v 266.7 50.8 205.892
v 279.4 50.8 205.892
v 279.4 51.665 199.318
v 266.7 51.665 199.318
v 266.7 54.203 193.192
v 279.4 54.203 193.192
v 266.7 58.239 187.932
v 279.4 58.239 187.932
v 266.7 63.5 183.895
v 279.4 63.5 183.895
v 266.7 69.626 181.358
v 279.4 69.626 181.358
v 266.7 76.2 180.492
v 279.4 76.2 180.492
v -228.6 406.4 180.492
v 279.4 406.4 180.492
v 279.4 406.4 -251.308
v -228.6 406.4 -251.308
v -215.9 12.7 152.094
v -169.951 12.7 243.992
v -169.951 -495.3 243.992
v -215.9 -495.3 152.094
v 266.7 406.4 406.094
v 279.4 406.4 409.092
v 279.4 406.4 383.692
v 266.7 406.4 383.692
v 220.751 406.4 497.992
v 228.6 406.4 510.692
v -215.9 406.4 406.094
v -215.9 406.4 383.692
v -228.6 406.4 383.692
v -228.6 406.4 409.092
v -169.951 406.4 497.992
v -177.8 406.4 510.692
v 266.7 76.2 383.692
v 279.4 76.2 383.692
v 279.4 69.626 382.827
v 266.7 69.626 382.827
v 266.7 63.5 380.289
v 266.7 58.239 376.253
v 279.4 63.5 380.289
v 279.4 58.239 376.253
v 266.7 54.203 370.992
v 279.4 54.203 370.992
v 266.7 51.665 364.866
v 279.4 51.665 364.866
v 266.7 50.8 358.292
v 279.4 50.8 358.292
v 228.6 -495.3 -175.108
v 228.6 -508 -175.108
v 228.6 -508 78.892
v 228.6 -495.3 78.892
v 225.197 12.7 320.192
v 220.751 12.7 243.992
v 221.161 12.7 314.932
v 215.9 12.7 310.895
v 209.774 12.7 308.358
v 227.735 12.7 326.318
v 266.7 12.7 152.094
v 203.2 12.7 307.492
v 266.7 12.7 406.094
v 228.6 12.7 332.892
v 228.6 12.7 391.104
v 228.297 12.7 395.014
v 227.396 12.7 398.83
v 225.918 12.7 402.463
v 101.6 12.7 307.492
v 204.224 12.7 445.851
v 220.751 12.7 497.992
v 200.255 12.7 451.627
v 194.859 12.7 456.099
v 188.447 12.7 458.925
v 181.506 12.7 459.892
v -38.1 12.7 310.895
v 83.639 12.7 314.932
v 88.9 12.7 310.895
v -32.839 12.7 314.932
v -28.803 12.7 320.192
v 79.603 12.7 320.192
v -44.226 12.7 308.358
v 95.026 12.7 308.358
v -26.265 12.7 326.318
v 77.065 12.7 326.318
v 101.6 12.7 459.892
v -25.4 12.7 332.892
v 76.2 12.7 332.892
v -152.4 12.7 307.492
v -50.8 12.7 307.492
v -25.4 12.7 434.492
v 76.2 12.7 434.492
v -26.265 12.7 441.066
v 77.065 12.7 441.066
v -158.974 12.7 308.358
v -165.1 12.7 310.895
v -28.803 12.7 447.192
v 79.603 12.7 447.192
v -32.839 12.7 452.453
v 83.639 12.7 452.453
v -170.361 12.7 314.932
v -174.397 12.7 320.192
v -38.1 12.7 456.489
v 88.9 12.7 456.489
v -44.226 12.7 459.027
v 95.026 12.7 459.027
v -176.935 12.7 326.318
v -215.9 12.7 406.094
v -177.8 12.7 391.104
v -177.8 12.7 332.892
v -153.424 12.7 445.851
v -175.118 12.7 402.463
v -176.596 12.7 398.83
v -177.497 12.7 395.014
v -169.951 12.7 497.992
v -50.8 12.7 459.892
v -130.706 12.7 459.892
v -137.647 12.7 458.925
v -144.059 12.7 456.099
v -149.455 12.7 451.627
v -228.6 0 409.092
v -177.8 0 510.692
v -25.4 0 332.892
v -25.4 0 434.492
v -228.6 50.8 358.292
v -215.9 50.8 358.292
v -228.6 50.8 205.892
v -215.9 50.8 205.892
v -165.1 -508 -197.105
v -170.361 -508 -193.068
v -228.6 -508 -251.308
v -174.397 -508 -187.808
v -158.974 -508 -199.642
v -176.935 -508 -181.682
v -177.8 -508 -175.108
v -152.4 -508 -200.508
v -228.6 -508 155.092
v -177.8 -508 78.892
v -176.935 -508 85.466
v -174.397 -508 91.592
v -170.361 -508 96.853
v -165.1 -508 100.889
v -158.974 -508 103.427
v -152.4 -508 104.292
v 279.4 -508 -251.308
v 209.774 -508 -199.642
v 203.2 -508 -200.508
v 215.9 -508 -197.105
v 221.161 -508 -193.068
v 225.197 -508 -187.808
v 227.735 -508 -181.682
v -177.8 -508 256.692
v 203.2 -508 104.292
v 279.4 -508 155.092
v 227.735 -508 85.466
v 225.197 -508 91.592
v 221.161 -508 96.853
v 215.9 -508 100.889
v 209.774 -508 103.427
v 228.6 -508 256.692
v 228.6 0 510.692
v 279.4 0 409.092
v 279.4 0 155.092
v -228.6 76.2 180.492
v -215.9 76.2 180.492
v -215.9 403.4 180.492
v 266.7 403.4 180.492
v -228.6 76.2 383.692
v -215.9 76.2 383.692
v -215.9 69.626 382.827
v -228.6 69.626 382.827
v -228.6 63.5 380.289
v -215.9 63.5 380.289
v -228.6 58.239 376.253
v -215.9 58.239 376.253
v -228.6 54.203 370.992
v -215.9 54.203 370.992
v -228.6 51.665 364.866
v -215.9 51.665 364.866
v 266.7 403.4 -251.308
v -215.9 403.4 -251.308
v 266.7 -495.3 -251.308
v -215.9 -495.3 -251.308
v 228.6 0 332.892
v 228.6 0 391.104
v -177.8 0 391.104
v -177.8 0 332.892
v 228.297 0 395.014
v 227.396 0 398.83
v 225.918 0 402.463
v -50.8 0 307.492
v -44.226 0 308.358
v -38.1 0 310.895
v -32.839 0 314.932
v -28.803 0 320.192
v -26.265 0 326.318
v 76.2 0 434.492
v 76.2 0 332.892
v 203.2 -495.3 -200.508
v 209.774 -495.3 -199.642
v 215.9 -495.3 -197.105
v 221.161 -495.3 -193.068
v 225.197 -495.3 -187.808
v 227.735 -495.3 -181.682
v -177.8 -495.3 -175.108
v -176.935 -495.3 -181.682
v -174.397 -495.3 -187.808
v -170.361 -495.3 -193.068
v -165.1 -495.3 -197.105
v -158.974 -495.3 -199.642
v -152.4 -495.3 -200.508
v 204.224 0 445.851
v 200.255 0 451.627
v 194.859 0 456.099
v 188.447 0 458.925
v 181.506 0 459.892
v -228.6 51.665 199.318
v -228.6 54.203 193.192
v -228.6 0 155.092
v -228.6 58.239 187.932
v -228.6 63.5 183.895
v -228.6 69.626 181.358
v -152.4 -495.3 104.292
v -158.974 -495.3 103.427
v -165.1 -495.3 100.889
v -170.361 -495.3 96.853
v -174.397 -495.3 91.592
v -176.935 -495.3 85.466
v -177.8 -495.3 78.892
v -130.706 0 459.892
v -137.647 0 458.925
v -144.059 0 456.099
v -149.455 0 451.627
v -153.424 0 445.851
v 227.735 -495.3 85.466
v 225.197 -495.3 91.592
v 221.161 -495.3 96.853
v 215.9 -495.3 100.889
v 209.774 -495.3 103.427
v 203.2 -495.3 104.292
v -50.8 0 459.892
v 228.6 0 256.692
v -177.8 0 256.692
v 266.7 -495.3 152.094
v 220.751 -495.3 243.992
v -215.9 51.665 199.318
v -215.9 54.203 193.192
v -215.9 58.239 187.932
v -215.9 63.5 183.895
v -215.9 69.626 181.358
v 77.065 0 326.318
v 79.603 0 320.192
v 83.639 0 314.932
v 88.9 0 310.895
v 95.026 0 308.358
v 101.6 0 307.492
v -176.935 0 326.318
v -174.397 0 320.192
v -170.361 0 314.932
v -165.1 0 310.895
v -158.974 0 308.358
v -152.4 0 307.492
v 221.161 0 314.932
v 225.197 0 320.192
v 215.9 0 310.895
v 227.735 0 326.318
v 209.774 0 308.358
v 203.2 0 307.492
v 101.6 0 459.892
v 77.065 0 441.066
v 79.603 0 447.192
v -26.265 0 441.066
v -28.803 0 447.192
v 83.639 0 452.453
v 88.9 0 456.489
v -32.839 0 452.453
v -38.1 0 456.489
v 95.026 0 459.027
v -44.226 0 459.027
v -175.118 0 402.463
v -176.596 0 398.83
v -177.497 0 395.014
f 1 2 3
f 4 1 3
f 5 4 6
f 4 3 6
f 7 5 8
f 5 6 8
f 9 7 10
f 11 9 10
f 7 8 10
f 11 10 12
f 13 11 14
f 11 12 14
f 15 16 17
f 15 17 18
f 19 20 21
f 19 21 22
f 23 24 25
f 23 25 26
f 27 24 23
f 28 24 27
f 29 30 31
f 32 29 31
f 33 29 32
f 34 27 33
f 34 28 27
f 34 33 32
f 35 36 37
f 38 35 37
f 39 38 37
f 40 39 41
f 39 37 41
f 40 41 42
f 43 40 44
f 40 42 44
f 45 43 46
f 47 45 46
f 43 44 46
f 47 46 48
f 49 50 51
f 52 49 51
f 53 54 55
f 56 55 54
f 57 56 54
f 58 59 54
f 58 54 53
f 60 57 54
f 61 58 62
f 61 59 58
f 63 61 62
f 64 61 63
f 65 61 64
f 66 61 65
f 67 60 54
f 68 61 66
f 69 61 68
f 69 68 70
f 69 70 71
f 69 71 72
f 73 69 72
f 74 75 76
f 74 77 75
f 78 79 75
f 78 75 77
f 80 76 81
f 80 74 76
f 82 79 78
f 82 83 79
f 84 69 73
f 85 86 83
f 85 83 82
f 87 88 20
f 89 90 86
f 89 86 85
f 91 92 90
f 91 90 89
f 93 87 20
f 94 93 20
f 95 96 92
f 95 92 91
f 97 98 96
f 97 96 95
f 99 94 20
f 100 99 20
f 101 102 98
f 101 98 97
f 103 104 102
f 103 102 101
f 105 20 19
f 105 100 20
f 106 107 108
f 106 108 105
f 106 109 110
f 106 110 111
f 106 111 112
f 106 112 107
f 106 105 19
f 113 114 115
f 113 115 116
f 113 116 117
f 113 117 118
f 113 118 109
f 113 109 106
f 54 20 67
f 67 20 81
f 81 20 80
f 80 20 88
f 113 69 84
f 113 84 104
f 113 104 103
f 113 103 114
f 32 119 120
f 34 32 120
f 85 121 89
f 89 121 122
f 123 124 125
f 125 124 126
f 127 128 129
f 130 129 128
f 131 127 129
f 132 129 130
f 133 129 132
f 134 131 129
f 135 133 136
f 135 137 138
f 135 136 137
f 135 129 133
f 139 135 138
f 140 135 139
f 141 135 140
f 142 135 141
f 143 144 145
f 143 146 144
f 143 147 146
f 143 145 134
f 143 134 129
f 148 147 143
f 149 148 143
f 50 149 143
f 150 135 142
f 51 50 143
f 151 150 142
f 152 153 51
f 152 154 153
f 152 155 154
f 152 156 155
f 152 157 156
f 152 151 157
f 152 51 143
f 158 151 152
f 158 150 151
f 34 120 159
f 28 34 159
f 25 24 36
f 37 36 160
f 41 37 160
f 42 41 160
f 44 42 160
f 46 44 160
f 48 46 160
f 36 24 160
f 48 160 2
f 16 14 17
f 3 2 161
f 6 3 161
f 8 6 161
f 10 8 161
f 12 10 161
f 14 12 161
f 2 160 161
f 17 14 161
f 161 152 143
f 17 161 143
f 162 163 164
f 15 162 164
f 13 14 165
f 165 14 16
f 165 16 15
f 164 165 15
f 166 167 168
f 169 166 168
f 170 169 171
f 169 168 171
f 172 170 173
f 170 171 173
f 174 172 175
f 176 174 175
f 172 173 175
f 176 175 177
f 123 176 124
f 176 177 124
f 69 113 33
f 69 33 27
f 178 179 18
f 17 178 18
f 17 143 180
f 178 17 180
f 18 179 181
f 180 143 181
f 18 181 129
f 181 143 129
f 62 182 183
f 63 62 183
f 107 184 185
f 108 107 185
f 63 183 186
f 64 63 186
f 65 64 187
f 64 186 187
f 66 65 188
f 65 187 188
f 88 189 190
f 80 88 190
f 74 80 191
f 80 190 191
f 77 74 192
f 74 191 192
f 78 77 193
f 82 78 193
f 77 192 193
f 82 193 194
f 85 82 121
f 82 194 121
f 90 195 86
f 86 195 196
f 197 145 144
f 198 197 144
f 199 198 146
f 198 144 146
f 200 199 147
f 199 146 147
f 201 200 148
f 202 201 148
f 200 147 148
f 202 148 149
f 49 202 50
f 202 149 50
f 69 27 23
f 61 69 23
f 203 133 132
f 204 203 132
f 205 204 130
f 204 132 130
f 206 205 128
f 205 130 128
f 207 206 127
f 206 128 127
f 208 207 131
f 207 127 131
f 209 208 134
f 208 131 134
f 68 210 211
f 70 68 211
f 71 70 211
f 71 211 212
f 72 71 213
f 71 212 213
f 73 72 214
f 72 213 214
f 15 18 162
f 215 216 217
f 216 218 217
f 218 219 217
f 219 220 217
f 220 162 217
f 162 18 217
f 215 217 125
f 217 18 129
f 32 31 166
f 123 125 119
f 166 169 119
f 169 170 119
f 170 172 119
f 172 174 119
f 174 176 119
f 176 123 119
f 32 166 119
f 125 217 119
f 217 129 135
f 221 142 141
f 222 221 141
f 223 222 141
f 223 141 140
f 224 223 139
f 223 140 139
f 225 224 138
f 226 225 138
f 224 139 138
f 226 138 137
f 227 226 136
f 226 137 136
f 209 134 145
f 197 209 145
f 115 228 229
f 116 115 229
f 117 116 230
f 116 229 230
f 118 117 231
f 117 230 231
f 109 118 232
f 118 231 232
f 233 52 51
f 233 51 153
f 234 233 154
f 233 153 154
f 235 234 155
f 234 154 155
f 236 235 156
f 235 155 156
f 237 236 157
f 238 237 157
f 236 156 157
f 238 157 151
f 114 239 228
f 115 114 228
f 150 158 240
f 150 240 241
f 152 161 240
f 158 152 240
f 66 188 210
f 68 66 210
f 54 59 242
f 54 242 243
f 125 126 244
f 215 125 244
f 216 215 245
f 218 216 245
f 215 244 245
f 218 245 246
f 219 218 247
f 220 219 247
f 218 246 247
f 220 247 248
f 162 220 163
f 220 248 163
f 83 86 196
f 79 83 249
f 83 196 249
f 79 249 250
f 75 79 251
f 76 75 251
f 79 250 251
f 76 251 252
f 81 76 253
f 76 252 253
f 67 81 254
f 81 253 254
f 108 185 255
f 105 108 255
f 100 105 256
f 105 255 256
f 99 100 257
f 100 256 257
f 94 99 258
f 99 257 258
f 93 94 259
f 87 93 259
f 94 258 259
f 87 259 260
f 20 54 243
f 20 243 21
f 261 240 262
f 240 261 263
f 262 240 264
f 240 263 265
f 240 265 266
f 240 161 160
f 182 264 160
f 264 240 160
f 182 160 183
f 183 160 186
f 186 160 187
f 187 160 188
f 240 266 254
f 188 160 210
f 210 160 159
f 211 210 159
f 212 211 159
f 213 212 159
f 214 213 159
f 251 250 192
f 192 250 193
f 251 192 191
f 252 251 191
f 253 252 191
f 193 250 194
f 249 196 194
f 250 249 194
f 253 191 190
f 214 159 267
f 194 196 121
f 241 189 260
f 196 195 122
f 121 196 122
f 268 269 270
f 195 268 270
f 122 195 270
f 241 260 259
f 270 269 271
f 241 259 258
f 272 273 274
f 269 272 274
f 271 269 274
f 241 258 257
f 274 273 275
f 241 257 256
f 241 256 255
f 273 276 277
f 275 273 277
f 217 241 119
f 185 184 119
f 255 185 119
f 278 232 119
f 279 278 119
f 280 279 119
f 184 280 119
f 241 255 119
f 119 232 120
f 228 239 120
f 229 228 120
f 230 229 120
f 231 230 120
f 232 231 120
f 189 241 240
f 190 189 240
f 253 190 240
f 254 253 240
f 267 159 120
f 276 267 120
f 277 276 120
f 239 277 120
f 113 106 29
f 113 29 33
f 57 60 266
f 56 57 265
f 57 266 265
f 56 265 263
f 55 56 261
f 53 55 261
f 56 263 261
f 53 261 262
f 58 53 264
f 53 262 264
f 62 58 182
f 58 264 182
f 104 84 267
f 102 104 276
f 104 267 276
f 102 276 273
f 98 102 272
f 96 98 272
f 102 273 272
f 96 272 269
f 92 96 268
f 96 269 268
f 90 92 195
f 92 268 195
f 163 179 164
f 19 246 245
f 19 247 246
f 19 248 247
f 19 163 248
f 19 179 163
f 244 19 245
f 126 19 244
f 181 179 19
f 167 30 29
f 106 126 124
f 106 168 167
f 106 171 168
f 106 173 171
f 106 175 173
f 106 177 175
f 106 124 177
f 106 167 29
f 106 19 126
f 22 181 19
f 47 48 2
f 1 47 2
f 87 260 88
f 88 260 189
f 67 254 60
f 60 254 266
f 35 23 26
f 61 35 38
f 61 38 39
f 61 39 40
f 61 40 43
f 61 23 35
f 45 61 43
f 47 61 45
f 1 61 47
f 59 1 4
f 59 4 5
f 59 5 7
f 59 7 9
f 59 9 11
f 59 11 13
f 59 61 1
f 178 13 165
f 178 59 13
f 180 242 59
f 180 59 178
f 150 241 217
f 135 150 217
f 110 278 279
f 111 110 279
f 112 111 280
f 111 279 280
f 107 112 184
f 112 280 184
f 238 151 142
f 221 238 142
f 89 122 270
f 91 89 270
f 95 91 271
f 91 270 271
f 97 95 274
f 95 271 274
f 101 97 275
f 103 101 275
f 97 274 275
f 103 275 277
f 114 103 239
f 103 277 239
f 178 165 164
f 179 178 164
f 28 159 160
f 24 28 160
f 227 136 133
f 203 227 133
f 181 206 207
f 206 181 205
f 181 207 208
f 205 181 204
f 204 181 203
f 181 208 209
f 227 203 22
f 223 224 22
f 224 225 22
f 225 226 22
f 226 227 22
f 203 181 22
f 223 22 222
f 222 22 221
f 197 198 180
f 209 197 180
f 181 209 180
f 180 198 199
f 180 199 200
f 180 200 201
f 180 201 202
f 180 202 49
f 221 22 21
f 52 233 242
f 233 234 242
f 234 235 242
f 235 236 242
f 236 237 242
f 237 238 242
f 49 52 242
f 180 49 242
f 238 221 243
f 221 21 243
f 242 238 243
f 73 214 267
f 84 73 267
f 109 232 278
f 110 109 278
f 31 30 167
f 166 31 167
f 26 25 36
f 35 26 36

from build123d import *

# Parameters (mm, degrees)
F1_DEPTH  = 508
F3_DEPTH  = 406.4
F4_T      = -12.7
F6_DEPTH  = 508.001
F8_DEPTH  = 25.4
F10_DEPTH = 25.4
F11_W     = 508
F11_H     = 431.8
F12_DEPTH = 3


with BuildPart() as f1:
    # F0 (on Front) → F1 (new body)
    with BuildSketch(Plane.XZ):
        Polygon((-228.6, 155.0921710968), (-228.6, -251.3078289032), (279.4, -251.3078289032), (279.4, 155.0921710968), (228.6, 256.6921710968), (-177.8, 256.6921710968), align=None)
    extrude(amount=F1_DEPTH)

    # F2 (on face) → F3 (join)
    with BuildSketch(Plane(origin=(0, 0, 0), x_dir=(-1, 0, 0), z_dir=(0, 1, 0))):
        Polygon((-279.4, 409.0921710968), (-279.4, -251.3078289032), (228.6, -251.3078289032), (228.6, 409.0921710968), (177.8, 510.6921710968), (-228.6, 510.6921710968), align=None)
    extrude(amount=F3_DEPTH)

    # F4
    f4_openings = [f1.faces().sort_by_distance(p)[0] for p in [
        (25.4, -50.8, -251.307829),
        (25.4, 406.4, 125.00118),
    ]]
    offset(amount=F4_T, openings=f4_openings, kind=Kind.INTERSECTION)

    # F5 (on face) → F6 (cut, through all)
    with BuildSketch(Plane.YZ.offset(279.4)):
        with BuildLine():
            Line((406.4, 180.4921710968), (406.4, 383.6921710968))
            Line((406.4, 383.6921710968), (76.2, 383.6921710968))
            ThreePointArc((76.2, 383.6921710968), (58.2394877579, 376.2526833389), (50.8, 358.2921710968))
            Line((50.8, 358.2921710968), (50.8, 205.8921710968))
            ThreePointArc((50.8, 205.8921710968), (58.2394877579, 187.9316588547), (76.2, 180.4921710968))
            Line((76.2, 180.4921710968), (406.4, 180.4921710968))
        make_face()
    extrude(amount=-F6_DEPTH, mode=Mode.SUBTRACT)

    # F7 (on face) → F8 (cut)
    with BuildSketch(Plane.XZ.offset(508)):
        with BuildLine():
            Line((203.2, 104.2921710968), (-152.4, 104.2921710968))
            ThreePointArc((-152.4, 104.2921710968), (-170.3605122421, 96.8526833389), (-177.8, 78.8921710968))
            Line((-177.8, 78.8921710968), (-177.8, -175.1078289032))
            ThreePointArc((-177.8, -175.1078289032), (-170.3605122421, -193.0683411453), (-152.4, -200.5078289032))
            Line((-152.4, -200.5078289032), (203.2, -200.5078289032))
            ThreePointArc((203.2, -200.5078289032), (221.1605122421, -193.0683411453), (228.6, -175.1078289032))
            Line((228.6, -175.1078289032), (228.6, 78.8921710968))
            ThreePointArc((228.6, 78.8921710968), (221.1605122421, 96.8526833389), (203.2, 104.2921710968))
        make_face()
    extrude(amount=-F8_DEPTH, mode=Mode.SUBTRACT)

    # F9 (on face) → F10 (cut)
    with BuildSketch(Plane.XZ):
        with BuildLine():
            ThreePointArc((-177.8, 332.8921710968), (-170.3605122421, 314.9316588547), (-152.4, 307.4921710968))
            Line((-152.4, 307.4921710968), (-50.8, 307.4921710968))
            ThreePointArc((-50.8, 307.4921710968), (-32.8394877579, 314.9316588547), (-25.4, 332.8921710968))
            Line((-25.4, 332.8921710968), (-25.4, 434.4921710968))
            ThreePointArc((-25.4, 434.4921710968), (-32.8394877579, 452.4526833389), (-50.8, 459.8921710968))
            Line((-50.8, 459.8921710968), (-130.7058100573, 459.8921710968))
            ThreePointArc((-130.7058100573, 459.8921710968), (-144.0593803051, 456.0987016289), (-153.4242607087, 445.8513964225))
            Line((-153.4242607087, 445.8513964225), (-175.1184506514, 402.463016537))
            ThreePointArc((-175.1184506514, 402.463016537), (-177.1205243325, 396.9395153932), (-177.8, 391.1037912113))
            Line((-177.8, 391.1037912113), (-177.8, 332.8921710968))
        make_face()
        with BuildLine():
            ThreePointArc((101.6, 459.8921710968), (83.6394877579, 452.4526833389), (76.2, 434.4921710968))
            Line((76.2, 434.4921710968), (76.2, 332.8921710968))
            ThreePointArc((76.2, 332.8921710968), (83.6394877579, 314.9316588547), (101.6, 307.4921710968))
            Line((101.6, 307.4921710968), (203.2, 307.4921710968))
            ThreePointArc((203.2, 307.4921710968), (221.1605122421, 314.9316588547), (228.6, 332.8921710968))
            Line((228.6, 332.8921710968), (228.6, 391.1037912113))
            ThreePointArc((228.6, 391.1037912113), (227.9205243325, 396.9395153932), (225.9184506514, 402.463016537))
            Line((225.9184506514, 402.463016537), (204.2242607087, 445.8513964225))
            ThreePointArc((204.2242607087, 445.8513964225), (194.8593803051, 456.0987016289), (181.5058100573, 459.8921710968))
            Line((181.5058100573, 459.8921710968), (101.6, 459.8921710968))
        make_face()
    extrude(amount=-F10_DEPTH, mode=Mode.SUBTRACT)

    # F11 (on face) → F12 (join)
    with BuildSketch(Plane(origin=(0, 406.4, 0), x_dir=(-1, 0, 0), z_dir=(0, 1, 0))):
        with Locations((-25.4, -35.4078289032)):
            Rectangle(F11_W, F11_H)
    extrude(amount=-F12_DEPTH)


solid = f1.part
